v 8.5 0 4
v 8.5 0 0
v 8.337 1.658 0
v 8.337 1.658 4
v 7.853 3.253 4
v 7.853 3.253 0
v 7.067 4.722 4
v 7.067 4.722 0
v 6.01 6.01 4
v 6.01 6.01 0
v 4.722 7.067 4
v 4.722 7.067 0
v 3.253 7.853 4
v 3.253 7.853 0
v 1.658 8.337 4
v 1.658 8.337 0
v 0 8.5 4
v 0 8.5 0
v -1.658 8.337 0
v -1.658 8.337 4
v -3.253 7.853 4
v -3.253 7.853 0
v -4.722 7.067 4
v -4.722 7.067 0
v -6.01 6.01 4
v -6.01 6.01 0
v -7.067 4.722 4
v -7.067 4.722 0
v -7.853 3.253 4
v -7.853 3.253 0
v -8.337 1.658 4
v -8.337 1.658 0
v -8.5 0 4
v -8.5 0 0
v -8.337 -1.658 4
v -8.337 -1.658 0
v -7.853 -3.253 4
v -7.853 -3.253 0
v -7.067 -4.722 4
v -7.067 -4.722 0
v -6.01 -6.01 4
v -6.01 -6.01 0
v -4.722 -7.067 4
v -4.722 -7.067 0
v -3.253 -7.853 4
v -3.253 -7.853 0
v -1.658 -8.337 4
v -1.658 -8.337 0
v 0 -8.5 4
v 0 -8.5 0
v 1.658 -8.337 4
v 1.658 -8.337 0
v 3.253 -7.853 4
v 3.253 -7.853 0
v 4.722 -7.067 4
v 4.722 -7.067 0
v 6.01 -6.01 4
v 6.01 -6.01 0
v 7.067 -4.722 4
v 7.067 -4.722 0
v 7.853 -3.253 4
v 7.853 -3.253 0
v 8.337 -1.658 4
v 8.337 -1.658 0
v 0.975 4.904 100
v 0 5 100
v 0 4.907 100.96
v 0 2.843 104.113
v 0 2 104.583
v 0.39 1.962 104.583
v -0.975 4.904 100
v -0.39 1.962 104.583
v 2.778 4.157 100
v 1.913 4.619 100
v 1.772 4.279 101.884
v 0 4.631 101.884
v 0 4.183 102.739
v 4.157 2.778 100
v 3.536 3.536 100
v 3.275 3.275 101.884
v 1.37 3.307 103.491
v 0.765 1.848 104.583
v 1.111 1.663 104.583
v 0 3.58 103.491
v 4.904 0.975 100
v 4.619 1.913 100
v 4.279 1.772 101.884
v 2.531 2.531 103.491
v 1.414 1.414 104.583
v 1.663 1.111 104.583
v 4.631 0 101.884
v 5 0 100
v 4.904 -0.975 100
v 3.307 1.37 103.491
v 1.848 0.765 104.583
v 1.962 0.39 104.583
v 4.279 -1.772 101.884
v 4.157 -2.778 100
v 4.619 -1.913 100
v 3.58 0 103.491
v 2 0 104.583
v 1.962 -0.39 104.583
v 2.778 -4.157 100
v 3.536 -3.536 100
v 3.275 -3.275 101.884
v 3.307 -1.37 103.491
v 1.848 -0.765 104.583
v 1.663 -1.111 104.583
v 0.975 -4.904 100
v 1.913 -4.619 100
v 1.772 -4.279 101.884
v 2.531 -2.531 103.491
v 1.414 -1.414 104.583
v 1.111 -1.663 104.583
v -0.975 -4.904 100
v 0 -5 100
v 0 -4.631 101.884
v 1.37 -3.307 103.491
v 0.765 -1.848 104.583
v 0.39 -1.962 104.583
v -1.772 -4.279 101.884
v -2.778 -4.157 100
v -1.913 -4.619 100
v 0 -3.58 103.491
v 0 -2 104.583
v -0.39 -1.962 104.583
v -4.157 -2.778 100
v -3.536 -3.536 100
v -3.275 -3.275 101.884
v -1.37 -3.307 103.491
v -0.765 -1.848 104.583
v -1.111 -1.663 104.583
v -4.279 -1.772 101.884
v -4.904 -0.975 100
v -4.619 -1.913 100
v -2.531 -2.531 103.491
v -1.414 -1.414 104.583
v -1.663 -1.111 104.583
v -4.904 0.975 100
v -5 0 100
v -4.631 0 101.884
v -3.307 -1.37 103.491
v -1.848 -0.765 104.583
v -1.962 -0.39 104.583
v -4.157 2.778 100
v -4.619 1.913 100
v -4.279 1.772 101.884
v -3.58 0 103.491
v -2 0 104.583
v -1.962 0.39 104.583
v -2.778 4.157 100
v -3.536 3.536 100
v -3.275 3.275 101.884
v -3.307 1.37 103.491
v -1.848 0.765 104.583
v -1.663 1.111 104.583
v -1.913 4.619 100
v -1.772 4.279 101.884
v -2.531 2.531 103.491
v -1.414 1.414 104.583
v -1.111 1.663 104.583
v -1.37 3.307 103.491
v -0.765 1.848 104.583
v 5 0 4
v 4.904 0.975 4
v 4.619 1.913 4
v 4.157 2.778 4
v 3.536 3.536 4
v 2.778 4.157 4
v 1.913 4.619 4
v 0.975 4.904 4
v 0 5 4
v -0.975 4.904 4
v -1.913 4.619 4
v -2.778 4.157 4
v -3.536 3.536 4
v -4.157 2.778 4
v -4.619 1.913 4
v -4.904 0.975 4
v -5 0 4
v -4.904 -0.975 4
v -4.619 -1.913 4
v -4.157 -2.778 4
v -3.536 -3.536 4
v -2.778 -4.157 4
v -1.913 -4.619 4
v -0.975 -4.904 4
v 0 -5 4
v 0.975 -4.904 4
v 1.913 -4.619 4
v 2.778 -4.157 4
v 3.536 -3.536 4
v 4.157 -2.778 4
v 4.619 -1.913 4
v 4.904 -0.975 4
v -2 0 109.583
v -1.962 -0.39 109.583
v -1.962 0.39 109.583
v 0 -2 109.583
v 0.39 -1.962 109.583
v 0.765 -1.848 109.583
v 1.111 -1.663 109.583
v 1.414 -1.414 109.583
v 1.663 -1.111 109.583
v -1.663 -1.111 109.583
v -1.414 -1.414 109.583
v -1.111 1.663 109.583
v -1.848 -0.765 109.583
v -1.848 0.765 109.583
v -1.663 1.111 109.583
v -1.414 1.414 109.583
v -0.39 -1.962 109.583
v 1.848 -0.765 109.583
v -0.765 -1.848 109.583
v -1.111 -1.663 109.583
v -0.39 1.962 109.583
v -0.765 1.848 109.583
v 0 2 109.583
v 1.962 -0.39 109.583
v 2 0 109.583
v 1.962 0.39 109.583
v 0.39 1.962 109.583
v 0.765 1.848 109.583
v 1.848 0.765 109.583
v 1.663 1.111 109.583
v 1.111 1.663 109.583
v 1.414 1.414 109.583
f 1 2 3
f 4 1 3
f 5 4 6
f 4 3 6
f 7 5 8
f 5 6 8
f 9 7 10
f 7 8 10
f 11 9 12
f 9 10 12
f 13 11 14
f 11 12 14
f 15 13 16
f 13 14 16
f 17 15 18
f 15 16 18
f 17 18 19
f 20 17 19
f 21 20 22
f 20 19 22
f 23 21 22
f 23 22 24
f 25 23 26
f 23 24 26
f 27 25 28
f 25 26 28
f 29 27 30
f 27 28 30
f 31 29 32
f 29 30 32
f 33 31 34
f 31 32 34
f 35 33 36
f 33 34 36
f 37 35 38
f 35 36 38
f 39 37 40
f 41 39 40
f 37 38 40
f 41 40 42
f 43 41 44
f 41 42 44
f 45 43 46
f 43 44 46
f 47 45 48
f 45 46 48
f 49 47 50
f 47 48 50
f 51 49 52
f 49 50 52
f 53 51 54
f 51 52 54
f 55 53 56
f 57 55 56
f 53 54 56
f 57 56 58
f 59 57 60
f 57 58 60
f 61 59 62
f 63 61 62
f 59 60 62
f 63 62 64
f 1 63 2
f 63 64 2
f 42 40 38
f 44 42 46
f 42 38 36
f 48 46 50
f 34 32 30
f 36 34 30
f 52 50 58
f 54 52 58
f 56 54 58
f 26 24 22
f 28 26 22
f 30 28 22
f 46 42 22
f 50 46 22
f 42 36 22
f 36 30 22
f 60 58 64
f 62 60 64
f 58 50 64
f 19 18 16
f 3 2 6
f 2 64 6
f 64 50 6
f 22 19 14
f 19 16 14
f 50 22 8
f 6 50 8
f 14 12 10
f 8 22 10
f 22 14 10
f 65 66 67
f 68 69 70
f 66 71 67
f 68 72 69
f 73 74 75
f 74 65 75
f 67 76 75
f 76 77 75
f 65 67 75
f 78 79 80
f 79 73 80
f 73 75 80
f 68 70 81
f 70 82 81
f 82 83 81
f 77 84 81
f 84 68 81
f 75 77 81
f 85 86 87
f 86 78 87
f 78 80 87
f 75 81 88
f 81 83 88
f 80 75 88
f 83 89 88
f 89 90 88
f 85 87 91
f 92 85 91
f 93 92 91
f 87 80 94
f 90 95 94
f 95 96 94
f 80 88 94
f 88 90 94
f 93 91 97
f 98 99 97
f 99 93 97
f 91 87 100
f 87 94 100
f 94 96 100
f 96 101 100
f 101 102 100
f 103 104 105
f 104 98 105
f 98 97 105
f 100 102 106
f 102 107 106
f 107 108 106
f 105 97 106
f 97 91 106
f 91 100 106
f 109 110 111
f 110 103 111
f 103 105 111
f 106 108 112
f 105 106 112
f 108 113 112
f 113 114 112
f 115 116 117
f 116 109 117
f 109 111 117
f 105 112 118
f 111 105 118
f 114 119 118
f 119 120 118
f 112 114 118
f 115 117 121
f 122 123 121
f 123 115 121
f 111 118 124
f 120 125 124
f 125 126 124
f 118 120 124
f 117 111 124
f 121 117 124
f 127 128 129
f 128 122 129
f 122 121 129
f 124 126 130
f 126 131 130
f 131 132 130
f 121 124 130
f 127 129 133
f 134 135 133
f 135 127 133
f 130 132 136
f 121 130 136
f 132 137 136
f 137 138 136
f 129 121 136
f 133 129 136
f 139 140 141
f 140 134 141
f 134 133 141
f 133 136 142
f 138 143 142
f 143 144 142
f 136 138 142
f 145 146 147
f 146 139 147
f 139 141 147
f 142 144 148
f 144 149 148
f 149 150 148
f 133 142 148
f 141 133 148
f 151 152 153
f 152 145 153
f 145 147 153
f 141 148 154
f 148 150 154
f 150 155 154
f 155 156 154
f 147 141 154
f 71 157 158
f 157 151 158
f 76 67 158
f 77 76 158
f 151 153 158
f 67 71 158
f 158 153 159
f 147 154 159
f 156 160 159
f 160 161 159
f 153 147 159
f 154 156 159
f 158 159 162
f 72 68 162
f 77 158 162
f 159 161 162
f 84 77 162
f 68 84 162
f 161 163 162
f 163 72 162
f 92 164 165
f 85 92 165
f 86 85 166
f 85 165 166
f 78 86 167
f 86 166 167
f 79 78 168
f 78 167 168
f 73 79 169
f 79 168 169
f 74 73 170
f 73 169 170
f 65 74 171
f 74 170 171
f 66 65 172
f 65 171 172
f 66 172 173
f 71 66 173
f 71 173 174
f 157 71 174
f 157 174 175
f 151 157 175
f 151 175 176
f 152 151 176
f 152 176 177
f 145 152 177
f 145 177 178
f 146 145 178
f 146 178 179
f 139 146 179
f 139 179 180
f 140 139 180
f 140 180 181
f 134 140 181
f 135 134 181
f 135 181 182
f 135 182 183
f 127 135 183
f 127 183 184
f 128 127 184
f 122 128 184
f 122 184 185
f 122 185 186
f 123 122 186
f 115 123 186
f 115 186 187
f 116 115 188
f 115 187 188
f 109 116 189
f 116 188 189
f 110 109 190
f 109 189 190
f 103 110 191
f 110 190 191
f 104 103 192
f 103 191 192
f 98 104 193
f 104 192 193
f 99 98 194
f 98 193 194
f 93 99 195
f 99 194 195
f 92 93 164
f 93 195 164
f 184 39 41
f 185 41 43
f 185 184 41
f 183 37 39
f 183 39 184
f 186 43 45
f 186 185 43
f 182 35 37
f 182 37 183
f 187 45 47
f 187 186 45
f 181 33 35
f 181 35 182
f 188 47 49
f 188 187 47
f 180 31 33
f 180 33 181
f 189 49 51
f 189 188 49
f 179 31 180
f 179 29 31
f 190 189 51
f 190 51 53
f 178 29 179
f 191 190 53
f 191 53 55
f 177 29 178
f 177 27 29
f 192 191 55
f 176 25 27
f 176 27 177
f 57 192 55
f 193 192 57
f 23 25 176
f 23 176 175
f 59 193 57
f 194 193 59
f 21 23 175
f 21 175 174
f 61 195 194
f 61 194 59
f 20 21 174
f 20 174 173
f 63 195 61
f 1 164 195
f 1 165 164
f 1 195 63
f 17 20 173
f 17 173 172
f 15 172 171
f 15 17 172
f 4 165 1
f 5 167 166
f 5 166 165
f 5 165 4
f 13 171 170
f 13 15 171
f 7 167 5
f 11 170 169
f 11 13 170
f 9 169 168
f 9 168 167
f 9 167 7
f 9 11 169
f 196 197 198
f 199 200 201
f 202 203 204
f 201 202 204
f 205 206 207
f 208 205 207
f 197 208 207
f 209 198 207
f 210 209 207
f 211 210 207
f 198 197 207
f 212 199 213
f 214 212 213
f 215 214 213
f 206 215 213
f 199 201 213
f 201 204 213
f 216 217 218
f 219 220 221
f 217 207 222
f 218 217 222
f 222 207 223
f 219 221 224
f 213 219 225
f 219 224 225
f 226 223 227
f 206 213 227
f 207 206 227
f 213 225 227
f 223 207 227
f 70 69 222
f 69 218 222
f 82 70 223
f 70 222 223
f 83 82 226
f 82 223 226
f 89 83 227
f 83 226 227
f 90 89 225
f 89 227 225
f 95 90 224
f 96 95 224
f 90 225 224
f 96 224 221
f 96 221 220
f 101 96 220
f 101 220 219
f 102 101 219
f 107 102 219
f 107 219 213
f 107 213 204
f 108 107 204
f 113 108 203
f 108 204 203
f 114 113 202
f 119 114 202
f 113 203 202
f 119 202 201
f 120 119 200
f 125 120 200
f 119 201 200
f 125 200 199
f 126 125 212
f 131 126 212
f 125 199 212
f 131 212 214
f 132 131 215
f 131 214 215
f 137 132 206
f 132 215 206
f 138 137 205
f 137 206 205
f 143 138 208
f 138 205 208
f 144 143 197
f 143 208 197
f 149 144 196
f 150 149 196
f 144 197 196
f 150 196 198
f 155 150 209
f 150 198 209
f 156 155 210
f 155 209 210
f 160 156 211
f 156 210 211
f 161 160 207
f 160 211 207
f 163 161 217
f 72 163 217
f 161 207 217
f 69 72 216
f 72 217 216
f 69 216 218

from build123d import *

# Parameters (mm, degrees)
F0_R     = 8.5
F1_DEPTH = 4
F2_R     = 5
F3_DEPTH = 100


with BuildPart() as f1:
    # F0 (on Top) → F1 (new body)
    with BuildSketch(Plane.XY):
        Circle(F0_R)
    extrude(amount=F1_DEPTH)

    # F2 (on Top) → F3 (join)
    with BuildSketch(Plane.XY):
        Circle(F2_R)
    extrude(amount=F3_DEPTH)

    # F4 (on Right) → F5 (revolve)
    with BuildSketch(Plane.YZ):
        with BuildLine():
            Line((0, 104.582576), (0, 100))
            Line((0, 100), (5, 100))
            ThreePointArc((5, 100), (4.1833, 102.738613), (2, 104.582576))
            Line((2, 104.582576), (0, 104.582576))
        make_face()
        with BuildLine():
            ThreePointArc((0, 105), (1.021548, 104.894532), (2, 104.582576))
            Line((2, 104.582576), (2, 109.582576))
            Line((2, 109.582576), (0, 109.582576))
            Line((0, 109.582576), (0, 105))
        make_face()
        with BuildLine():
            Line((0, 105), (0, 104.582576))
            Line((0, 104.582576), (2, 104.582576))
            ThreePointArc((2, 104.582576), (1.021548, 104.894532), (0, 105))
        make_face()
    revolve(axis=Axis((0, 0, 104.791288), (0, 0, -1)))


solid = f1.part
